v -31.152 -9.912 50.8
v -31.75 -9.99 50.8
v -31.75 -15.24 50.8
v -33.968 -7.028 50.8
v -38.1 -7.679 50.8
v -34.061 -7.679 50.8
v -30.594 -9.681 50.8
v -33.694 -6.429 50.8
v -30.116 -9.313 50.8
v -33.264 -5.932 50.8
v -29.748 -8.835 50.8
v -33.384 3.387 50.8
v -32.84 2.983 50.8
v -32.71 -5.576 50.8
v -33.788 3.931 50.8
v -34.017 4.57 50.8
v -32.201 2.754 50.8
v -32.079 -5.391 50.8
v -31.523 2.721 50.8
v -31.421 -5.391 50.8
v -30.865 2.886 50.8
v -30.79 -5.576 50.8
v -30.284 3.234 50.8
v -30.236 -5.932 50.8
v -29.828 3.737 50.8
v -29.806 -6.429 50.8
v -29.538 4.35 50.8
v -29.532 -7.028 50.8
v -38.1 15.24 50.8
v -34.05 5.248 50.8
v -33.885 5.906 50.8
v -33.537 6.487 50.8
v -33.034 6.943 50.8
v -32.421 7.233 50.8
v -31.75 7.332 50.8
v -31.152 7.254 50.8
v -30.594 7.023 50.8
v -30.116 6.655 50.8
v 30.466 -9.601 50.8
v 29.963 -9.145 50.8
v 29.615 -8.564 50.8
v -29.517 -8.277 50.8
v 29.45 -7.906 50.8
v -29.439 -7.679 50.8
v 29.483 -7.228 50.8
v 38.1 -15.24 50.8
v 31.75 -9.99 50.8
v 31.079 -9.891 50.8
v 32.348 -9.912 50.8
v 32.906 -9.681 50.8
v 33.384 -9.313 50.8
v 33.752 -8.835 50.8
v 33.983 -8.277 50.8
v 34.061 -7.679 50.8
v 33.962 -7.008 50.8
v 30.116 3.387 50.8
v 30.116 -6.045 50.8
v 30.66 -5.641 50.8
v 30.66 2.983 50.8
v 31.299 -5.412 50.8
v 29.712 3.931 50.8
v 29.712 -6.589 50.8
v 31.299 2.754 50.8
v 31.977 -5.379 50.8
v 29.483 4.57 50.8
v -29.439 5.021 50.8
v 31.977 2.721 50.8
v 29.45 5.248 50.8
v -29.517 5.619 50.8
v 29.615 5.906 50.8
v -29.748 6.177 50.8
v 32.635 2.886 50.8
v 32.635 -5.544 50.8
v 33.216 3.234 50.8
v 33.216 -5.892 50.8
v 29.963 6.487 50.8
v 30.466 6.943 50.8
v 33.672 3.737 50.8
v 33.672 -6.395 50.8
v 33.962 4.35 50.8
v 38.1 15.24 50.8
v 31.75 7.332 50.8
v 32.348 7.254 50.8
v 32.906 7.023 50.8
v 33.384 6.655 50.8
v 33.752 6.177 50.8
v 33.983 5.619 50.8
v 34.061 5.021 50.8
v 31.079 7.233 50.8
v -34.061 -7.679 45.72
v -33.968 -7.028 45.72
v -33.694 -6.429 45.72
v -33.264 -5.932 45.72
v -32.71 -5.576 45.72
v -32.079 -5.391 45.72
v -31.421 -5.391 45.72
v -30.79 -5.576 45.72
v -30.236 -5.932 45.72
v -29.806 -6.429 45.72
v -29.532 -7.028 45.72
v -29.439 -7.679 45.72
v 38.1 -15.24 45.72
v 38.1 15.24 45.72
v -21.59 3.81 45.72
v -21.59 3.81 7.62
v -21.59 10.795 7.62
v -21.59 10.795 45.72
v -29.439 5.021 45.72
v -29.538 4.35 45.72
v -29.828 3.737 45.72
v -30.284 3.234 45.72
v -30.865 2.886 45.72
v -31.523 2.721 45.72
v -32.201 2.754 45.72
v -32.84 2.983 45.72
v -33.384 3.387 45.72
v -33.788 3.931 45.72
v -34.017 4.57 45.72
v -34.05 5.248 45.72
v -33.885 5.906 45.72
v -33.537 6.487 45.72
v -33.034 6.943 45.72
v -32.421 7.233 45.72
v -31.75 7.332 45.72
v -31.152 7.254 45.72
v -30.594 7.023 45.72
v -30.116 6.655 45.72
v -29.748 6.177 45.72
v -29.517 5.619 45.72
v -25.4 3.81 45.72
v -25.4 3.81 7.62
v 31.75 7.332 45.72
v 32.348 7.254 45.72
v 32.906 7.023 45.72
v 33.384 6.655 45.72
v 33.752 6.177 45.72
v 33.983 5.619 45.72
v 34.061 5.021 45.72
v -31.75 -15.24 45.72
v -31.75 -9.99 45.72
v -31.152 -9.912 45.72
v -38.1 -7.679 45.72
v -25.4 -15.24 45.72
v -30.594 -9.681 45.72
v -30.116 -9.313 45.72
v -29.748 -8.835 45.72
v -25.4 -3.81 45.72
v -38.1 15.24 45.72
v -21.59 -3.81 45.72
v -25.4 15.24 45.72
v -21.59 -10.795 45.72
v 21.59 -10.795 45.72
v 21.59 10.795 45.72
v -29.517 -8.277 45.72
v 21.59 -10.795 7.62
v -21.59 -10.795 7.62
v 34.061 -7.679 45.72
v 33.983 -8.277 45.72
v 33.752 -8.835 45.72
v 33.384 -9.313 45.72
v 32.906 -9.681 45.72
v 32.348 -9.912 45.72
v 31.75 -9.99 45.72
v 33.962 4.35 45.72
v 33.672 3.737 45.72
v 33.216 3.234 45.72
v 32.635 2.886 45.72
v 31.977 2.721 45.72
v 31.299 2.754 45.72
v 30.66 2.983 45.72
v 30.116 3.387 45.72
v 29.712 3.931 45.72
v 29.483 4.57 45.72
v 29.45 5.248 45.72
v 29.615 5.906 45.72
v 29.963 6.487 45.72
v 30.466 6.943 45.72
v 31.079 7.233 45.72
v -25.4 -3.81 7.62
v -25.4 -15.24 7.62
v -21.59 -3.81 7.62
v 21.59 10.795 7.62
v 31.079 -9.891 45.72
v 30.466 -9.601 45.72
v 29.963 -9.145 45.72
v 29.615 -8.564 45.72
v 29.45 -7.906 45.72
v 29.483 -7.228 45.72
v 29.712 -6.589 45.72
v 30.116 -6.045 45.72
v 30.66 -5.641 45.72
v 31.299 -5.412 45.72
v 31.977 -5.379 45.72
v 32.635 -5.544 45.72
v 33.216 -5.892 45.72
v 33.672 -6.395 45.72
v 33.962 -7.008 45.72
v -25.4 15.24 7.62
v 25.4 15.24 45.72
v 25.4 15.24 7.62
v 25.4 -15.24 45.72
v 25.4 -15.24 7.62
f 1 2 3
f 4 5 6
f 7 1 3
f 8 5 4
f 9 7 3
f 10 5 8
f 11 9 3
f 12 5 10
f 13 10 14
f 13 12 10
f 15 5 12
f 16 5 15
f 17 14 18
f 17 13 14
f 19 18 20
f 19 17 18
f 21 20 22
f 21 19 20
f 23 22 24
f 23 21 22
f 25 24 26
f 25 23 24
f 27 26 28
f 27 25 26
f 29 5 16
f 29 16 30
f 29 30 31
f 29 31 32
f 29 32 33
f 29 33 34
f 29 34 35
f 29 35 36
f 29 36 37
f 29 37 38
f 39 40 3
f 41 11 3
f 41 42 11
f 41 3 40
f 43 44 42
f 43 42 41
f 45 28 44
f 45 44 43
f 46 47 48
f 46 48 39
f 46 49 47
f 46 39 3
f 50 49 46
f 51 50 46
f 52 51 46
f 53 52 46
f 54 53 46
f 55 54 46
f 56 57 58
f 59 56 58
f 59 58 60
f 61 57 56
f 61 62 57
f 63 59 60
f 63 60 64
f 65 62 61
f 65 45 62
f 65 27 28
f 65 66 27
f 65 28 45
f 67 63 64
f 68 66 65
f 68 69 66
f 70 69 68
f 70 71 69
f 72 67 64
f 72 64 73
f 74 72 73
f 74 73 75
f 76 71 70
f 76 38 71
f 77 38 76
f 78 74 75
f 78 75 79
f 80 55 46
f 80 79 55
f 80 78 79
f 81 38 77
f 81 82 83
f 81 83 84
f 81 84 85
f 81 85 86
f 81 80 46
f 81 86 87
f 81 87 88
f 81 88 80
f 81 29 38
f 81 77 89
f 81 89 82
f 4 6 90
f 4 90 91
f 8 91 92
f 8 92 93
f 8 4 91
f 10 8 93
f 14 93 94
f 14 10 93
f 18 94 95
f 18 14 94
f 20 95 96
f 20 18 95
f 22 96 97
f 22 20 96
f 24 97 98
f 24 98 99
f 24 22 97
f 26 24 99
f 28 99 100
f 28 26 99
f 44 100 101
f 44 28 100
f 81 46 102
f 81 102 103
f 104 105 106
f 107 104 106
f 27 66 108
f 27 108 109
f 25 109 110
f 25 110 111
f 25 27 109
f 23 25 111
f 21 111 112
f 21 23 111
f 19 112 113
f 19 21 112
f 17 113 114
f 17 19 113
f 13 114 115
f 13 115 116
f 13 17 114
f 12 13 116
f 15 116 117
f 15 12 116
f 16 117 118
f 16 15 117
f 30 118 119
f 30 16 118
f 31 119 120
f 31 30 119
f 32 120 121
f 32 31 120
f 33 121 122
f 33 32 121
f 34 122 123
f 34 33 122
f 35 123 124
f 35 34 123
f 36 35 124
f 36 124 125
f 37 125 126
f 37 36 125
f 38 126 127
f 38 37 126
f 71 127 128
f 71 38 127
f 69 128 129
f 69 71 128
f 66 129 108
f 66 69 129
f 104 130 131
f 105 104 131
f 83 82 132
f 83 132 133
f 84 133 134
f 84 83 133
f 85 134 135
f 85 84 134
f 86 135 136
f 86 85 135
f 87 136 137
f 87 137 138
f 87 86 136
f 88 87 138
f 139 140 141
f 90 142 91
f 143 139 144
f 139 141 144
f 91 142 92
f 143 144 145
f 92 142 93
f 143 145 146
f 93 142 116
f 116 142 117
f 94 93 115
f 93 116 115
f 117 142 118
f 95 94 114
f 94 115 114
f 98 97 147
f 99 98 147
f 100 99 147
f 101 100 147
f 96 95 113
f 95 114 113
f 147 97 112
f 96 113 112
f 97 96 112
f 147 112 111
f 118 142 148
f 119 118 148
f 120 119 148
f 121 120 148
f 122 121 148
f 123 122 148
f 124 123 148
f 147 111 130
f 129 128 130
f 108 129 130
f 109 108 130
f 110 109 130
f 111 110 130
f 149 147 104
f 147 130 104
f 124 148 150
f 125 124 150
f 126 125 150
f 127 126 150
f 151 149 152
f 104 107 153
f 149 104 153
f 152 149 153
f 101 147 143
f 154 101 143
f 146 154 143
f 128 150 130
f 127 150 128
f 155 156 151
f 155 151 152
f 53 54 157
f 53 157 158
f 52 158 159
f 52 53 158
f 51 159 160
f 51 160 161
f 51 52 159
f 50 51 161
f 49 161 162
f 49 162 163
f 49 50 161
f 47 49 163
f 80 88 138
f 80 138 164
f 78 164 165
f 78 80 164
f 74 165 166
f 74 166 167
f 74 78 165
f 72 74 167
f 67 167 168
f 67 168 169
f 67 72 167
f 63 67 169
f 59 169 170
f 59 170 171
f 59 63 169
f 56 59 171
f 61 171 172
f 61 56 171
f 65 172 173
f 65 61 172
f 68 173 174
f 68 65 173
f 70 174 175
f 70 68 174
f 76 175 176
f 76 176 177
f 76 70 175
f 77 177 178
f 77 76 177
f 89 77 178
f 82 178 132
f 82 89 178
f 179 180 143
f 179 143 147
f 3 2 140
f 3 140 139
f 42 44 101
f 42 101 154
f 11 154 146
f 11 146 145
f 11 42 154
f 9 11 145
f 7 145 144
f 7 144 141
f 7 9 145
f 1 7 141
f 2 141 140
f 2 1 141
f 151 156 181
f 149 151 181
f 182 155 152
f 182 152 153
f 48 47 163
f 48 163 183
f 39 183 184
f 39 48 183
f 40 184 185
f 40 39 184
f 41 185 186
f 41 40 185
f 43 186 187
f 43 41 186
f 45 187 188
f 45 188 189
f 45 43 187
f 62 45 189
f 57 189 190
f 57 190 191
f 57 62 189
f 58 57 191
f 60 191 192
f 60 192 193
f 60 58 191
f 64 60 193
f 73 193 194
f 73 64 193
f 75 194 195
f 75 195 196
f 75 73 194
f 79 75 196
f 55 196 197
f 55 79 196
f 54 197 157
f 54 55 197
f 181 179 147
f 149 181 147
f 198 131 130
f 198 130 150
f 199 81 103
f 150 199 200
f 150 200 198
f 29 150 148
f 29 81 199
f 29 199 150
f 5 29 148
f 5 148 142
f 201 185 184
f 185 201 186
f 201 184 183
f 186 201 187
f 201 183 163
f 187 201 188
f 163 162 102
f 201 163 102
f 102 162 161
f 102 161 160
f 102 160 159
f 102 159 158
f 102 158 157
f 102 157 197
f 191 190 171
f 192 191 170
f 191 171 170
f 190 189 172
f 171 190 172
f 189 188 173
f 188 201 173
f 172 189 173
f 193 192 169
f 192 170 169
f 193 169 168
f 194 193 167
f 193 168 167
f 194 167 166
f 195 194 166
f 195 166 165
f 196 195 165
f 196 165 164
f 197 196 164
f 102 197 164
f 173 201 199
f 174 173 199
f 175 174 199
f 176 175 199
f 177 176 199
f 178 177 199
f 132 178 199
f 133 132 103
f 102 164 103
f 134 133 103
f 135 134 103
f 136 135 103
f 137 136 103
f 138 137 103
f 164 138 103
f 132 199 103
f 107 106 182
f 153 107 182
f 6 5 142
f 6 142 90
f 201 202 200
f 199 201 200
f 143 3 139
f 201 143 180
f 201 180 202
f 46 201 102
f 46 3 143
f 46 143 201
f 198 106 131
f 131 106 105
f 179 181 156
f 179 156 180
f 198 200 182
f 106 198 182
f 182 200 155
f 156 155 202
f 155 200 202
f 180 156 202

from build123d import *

# Parameters (mm, degrees)
F0_W     = 50.8
F0_H     = 30.48
F1_DEPTH = 50.8
F2_W     = 43.18
F2_H     = 21.59
F3_DEPTH = 45.72
F5_DEPTH = 5.08
F6_W     = 7.62
F6_H     = 45.72
F7_DEPTH = 13.47426
F8_W     = 30.48
F8_H     = 7.62
F9_DEPTH = 78.77304


with BuildPart() as f1:
    # F0 (on Top) → F1 (new body)
    with BuildSketch(Plane.XY):
        Rectangle(F0_W, F0_H)
    extrude(amount=F1_DEPTH)

    # F2 (on Top) → F3 (cut)
    with BuildSketch(Plane.XY):
        Rectangle(F2_W, F2_H)
    extrude(amount=F3_DEPTH, mode=Mode.SUBTRACT)

    # F4 (on face) → F5 (join)
    with BuildSketch(Plane.XY.offset(50.8)):
        Polygon((31.75, 15.24), (25.4, 15.24), (25.4, -15.24), (31.75, -15.24), (38.1, -15.24), (38.1, 15.24), align=None)
        with BuildLine():
            ThreePointArc((34.0614, -7.678979), (33.384407, -9.313385), (31.75, -9.990379))
            ThreePointArc((31.75, -9.990379), (30.115593, -6.044572), (34.0614, -7.678979))
        make_face(mode=Mode.SUBTRACT)
        with BuildLine():
            ThreePointArc((34.0614, 5.021021), (30.115593, 3.386615), (31.75, 7.332421))
            ThreePointArc((31.75, 7.332421), (33.384407, 6.655428), (34.0614, 5.021021))
        make_face(mode=Mode.SUBTRACT)
        with BuildLine():
            Line((-25.4, -15.24), (-25.4, 15.24))
            Line((-25.4, 15.24), (-31.75, 15.24))
            Line((-31.75, 15.24), (-38.1, 15.24))
            Line((-38.1, 15.24), (-38.1, -7.678979))
            Line((-38.1, -7.678979), (-34.0614, -7.678979))
            ThreePointArc((-34.0614, -7.678979), (-31.75, -5.367579), (-29.4386, -7.678979))
            ThreePointArc((-29.4386, -7.678979), (-30.115593, -9.313385), (-31.75, -9.990379))
            Line((-31.75, -9.990379), (-31.75, -15.24))
            Line((-31.75, -15.24), (-25.4, -15.24))
        make_face()
        with BuildLine():
            ThreePointArc((-29.4386, 5.021021), (-33.384407, 3.386615), (-31.75, 7.332421))
            ThreePointArc((-31.75, 7.332421), (-30.115593, 6.655428), (-29.4386, 5.021021))
        make_face(mode=Mode.SUBTRACT)
    extrude(amount=-F5_DEPTH)

    # F6 (on face) → F7 (cut)
    with BuildSketch(Plane(origin=(-25.4, 0, 0), x_dir=(0, -1, 0), z_dir=(-1, 0, 0))):
        with Locations((0, -22.86)):
            Rectangle(F6_W, F6_H)
        with Locations((0, 22.86)):
            Rectangle(F6_W, F6_H)
    extrude(amount=-F7_DEPTH, mode=Mode.SUBTRACT)

    # F8 (on face) → F9 (cut)
    with BuildSketch(Plane.YZ.offset(25.4)):
        with Locations((0, 3.81)):
            Rectangle(F8_W, F8_H)
        Polygon((26.814165, 7.62), (15.24, 7.62), (15.24, 0), (-15.24, 0), (-15.24, -4.411362), (26.814165, -4.411362), align=None)
    extrude(amount=-F9_DEPTH, mode=Mode.SUBTRACT)


solid = f1.part
